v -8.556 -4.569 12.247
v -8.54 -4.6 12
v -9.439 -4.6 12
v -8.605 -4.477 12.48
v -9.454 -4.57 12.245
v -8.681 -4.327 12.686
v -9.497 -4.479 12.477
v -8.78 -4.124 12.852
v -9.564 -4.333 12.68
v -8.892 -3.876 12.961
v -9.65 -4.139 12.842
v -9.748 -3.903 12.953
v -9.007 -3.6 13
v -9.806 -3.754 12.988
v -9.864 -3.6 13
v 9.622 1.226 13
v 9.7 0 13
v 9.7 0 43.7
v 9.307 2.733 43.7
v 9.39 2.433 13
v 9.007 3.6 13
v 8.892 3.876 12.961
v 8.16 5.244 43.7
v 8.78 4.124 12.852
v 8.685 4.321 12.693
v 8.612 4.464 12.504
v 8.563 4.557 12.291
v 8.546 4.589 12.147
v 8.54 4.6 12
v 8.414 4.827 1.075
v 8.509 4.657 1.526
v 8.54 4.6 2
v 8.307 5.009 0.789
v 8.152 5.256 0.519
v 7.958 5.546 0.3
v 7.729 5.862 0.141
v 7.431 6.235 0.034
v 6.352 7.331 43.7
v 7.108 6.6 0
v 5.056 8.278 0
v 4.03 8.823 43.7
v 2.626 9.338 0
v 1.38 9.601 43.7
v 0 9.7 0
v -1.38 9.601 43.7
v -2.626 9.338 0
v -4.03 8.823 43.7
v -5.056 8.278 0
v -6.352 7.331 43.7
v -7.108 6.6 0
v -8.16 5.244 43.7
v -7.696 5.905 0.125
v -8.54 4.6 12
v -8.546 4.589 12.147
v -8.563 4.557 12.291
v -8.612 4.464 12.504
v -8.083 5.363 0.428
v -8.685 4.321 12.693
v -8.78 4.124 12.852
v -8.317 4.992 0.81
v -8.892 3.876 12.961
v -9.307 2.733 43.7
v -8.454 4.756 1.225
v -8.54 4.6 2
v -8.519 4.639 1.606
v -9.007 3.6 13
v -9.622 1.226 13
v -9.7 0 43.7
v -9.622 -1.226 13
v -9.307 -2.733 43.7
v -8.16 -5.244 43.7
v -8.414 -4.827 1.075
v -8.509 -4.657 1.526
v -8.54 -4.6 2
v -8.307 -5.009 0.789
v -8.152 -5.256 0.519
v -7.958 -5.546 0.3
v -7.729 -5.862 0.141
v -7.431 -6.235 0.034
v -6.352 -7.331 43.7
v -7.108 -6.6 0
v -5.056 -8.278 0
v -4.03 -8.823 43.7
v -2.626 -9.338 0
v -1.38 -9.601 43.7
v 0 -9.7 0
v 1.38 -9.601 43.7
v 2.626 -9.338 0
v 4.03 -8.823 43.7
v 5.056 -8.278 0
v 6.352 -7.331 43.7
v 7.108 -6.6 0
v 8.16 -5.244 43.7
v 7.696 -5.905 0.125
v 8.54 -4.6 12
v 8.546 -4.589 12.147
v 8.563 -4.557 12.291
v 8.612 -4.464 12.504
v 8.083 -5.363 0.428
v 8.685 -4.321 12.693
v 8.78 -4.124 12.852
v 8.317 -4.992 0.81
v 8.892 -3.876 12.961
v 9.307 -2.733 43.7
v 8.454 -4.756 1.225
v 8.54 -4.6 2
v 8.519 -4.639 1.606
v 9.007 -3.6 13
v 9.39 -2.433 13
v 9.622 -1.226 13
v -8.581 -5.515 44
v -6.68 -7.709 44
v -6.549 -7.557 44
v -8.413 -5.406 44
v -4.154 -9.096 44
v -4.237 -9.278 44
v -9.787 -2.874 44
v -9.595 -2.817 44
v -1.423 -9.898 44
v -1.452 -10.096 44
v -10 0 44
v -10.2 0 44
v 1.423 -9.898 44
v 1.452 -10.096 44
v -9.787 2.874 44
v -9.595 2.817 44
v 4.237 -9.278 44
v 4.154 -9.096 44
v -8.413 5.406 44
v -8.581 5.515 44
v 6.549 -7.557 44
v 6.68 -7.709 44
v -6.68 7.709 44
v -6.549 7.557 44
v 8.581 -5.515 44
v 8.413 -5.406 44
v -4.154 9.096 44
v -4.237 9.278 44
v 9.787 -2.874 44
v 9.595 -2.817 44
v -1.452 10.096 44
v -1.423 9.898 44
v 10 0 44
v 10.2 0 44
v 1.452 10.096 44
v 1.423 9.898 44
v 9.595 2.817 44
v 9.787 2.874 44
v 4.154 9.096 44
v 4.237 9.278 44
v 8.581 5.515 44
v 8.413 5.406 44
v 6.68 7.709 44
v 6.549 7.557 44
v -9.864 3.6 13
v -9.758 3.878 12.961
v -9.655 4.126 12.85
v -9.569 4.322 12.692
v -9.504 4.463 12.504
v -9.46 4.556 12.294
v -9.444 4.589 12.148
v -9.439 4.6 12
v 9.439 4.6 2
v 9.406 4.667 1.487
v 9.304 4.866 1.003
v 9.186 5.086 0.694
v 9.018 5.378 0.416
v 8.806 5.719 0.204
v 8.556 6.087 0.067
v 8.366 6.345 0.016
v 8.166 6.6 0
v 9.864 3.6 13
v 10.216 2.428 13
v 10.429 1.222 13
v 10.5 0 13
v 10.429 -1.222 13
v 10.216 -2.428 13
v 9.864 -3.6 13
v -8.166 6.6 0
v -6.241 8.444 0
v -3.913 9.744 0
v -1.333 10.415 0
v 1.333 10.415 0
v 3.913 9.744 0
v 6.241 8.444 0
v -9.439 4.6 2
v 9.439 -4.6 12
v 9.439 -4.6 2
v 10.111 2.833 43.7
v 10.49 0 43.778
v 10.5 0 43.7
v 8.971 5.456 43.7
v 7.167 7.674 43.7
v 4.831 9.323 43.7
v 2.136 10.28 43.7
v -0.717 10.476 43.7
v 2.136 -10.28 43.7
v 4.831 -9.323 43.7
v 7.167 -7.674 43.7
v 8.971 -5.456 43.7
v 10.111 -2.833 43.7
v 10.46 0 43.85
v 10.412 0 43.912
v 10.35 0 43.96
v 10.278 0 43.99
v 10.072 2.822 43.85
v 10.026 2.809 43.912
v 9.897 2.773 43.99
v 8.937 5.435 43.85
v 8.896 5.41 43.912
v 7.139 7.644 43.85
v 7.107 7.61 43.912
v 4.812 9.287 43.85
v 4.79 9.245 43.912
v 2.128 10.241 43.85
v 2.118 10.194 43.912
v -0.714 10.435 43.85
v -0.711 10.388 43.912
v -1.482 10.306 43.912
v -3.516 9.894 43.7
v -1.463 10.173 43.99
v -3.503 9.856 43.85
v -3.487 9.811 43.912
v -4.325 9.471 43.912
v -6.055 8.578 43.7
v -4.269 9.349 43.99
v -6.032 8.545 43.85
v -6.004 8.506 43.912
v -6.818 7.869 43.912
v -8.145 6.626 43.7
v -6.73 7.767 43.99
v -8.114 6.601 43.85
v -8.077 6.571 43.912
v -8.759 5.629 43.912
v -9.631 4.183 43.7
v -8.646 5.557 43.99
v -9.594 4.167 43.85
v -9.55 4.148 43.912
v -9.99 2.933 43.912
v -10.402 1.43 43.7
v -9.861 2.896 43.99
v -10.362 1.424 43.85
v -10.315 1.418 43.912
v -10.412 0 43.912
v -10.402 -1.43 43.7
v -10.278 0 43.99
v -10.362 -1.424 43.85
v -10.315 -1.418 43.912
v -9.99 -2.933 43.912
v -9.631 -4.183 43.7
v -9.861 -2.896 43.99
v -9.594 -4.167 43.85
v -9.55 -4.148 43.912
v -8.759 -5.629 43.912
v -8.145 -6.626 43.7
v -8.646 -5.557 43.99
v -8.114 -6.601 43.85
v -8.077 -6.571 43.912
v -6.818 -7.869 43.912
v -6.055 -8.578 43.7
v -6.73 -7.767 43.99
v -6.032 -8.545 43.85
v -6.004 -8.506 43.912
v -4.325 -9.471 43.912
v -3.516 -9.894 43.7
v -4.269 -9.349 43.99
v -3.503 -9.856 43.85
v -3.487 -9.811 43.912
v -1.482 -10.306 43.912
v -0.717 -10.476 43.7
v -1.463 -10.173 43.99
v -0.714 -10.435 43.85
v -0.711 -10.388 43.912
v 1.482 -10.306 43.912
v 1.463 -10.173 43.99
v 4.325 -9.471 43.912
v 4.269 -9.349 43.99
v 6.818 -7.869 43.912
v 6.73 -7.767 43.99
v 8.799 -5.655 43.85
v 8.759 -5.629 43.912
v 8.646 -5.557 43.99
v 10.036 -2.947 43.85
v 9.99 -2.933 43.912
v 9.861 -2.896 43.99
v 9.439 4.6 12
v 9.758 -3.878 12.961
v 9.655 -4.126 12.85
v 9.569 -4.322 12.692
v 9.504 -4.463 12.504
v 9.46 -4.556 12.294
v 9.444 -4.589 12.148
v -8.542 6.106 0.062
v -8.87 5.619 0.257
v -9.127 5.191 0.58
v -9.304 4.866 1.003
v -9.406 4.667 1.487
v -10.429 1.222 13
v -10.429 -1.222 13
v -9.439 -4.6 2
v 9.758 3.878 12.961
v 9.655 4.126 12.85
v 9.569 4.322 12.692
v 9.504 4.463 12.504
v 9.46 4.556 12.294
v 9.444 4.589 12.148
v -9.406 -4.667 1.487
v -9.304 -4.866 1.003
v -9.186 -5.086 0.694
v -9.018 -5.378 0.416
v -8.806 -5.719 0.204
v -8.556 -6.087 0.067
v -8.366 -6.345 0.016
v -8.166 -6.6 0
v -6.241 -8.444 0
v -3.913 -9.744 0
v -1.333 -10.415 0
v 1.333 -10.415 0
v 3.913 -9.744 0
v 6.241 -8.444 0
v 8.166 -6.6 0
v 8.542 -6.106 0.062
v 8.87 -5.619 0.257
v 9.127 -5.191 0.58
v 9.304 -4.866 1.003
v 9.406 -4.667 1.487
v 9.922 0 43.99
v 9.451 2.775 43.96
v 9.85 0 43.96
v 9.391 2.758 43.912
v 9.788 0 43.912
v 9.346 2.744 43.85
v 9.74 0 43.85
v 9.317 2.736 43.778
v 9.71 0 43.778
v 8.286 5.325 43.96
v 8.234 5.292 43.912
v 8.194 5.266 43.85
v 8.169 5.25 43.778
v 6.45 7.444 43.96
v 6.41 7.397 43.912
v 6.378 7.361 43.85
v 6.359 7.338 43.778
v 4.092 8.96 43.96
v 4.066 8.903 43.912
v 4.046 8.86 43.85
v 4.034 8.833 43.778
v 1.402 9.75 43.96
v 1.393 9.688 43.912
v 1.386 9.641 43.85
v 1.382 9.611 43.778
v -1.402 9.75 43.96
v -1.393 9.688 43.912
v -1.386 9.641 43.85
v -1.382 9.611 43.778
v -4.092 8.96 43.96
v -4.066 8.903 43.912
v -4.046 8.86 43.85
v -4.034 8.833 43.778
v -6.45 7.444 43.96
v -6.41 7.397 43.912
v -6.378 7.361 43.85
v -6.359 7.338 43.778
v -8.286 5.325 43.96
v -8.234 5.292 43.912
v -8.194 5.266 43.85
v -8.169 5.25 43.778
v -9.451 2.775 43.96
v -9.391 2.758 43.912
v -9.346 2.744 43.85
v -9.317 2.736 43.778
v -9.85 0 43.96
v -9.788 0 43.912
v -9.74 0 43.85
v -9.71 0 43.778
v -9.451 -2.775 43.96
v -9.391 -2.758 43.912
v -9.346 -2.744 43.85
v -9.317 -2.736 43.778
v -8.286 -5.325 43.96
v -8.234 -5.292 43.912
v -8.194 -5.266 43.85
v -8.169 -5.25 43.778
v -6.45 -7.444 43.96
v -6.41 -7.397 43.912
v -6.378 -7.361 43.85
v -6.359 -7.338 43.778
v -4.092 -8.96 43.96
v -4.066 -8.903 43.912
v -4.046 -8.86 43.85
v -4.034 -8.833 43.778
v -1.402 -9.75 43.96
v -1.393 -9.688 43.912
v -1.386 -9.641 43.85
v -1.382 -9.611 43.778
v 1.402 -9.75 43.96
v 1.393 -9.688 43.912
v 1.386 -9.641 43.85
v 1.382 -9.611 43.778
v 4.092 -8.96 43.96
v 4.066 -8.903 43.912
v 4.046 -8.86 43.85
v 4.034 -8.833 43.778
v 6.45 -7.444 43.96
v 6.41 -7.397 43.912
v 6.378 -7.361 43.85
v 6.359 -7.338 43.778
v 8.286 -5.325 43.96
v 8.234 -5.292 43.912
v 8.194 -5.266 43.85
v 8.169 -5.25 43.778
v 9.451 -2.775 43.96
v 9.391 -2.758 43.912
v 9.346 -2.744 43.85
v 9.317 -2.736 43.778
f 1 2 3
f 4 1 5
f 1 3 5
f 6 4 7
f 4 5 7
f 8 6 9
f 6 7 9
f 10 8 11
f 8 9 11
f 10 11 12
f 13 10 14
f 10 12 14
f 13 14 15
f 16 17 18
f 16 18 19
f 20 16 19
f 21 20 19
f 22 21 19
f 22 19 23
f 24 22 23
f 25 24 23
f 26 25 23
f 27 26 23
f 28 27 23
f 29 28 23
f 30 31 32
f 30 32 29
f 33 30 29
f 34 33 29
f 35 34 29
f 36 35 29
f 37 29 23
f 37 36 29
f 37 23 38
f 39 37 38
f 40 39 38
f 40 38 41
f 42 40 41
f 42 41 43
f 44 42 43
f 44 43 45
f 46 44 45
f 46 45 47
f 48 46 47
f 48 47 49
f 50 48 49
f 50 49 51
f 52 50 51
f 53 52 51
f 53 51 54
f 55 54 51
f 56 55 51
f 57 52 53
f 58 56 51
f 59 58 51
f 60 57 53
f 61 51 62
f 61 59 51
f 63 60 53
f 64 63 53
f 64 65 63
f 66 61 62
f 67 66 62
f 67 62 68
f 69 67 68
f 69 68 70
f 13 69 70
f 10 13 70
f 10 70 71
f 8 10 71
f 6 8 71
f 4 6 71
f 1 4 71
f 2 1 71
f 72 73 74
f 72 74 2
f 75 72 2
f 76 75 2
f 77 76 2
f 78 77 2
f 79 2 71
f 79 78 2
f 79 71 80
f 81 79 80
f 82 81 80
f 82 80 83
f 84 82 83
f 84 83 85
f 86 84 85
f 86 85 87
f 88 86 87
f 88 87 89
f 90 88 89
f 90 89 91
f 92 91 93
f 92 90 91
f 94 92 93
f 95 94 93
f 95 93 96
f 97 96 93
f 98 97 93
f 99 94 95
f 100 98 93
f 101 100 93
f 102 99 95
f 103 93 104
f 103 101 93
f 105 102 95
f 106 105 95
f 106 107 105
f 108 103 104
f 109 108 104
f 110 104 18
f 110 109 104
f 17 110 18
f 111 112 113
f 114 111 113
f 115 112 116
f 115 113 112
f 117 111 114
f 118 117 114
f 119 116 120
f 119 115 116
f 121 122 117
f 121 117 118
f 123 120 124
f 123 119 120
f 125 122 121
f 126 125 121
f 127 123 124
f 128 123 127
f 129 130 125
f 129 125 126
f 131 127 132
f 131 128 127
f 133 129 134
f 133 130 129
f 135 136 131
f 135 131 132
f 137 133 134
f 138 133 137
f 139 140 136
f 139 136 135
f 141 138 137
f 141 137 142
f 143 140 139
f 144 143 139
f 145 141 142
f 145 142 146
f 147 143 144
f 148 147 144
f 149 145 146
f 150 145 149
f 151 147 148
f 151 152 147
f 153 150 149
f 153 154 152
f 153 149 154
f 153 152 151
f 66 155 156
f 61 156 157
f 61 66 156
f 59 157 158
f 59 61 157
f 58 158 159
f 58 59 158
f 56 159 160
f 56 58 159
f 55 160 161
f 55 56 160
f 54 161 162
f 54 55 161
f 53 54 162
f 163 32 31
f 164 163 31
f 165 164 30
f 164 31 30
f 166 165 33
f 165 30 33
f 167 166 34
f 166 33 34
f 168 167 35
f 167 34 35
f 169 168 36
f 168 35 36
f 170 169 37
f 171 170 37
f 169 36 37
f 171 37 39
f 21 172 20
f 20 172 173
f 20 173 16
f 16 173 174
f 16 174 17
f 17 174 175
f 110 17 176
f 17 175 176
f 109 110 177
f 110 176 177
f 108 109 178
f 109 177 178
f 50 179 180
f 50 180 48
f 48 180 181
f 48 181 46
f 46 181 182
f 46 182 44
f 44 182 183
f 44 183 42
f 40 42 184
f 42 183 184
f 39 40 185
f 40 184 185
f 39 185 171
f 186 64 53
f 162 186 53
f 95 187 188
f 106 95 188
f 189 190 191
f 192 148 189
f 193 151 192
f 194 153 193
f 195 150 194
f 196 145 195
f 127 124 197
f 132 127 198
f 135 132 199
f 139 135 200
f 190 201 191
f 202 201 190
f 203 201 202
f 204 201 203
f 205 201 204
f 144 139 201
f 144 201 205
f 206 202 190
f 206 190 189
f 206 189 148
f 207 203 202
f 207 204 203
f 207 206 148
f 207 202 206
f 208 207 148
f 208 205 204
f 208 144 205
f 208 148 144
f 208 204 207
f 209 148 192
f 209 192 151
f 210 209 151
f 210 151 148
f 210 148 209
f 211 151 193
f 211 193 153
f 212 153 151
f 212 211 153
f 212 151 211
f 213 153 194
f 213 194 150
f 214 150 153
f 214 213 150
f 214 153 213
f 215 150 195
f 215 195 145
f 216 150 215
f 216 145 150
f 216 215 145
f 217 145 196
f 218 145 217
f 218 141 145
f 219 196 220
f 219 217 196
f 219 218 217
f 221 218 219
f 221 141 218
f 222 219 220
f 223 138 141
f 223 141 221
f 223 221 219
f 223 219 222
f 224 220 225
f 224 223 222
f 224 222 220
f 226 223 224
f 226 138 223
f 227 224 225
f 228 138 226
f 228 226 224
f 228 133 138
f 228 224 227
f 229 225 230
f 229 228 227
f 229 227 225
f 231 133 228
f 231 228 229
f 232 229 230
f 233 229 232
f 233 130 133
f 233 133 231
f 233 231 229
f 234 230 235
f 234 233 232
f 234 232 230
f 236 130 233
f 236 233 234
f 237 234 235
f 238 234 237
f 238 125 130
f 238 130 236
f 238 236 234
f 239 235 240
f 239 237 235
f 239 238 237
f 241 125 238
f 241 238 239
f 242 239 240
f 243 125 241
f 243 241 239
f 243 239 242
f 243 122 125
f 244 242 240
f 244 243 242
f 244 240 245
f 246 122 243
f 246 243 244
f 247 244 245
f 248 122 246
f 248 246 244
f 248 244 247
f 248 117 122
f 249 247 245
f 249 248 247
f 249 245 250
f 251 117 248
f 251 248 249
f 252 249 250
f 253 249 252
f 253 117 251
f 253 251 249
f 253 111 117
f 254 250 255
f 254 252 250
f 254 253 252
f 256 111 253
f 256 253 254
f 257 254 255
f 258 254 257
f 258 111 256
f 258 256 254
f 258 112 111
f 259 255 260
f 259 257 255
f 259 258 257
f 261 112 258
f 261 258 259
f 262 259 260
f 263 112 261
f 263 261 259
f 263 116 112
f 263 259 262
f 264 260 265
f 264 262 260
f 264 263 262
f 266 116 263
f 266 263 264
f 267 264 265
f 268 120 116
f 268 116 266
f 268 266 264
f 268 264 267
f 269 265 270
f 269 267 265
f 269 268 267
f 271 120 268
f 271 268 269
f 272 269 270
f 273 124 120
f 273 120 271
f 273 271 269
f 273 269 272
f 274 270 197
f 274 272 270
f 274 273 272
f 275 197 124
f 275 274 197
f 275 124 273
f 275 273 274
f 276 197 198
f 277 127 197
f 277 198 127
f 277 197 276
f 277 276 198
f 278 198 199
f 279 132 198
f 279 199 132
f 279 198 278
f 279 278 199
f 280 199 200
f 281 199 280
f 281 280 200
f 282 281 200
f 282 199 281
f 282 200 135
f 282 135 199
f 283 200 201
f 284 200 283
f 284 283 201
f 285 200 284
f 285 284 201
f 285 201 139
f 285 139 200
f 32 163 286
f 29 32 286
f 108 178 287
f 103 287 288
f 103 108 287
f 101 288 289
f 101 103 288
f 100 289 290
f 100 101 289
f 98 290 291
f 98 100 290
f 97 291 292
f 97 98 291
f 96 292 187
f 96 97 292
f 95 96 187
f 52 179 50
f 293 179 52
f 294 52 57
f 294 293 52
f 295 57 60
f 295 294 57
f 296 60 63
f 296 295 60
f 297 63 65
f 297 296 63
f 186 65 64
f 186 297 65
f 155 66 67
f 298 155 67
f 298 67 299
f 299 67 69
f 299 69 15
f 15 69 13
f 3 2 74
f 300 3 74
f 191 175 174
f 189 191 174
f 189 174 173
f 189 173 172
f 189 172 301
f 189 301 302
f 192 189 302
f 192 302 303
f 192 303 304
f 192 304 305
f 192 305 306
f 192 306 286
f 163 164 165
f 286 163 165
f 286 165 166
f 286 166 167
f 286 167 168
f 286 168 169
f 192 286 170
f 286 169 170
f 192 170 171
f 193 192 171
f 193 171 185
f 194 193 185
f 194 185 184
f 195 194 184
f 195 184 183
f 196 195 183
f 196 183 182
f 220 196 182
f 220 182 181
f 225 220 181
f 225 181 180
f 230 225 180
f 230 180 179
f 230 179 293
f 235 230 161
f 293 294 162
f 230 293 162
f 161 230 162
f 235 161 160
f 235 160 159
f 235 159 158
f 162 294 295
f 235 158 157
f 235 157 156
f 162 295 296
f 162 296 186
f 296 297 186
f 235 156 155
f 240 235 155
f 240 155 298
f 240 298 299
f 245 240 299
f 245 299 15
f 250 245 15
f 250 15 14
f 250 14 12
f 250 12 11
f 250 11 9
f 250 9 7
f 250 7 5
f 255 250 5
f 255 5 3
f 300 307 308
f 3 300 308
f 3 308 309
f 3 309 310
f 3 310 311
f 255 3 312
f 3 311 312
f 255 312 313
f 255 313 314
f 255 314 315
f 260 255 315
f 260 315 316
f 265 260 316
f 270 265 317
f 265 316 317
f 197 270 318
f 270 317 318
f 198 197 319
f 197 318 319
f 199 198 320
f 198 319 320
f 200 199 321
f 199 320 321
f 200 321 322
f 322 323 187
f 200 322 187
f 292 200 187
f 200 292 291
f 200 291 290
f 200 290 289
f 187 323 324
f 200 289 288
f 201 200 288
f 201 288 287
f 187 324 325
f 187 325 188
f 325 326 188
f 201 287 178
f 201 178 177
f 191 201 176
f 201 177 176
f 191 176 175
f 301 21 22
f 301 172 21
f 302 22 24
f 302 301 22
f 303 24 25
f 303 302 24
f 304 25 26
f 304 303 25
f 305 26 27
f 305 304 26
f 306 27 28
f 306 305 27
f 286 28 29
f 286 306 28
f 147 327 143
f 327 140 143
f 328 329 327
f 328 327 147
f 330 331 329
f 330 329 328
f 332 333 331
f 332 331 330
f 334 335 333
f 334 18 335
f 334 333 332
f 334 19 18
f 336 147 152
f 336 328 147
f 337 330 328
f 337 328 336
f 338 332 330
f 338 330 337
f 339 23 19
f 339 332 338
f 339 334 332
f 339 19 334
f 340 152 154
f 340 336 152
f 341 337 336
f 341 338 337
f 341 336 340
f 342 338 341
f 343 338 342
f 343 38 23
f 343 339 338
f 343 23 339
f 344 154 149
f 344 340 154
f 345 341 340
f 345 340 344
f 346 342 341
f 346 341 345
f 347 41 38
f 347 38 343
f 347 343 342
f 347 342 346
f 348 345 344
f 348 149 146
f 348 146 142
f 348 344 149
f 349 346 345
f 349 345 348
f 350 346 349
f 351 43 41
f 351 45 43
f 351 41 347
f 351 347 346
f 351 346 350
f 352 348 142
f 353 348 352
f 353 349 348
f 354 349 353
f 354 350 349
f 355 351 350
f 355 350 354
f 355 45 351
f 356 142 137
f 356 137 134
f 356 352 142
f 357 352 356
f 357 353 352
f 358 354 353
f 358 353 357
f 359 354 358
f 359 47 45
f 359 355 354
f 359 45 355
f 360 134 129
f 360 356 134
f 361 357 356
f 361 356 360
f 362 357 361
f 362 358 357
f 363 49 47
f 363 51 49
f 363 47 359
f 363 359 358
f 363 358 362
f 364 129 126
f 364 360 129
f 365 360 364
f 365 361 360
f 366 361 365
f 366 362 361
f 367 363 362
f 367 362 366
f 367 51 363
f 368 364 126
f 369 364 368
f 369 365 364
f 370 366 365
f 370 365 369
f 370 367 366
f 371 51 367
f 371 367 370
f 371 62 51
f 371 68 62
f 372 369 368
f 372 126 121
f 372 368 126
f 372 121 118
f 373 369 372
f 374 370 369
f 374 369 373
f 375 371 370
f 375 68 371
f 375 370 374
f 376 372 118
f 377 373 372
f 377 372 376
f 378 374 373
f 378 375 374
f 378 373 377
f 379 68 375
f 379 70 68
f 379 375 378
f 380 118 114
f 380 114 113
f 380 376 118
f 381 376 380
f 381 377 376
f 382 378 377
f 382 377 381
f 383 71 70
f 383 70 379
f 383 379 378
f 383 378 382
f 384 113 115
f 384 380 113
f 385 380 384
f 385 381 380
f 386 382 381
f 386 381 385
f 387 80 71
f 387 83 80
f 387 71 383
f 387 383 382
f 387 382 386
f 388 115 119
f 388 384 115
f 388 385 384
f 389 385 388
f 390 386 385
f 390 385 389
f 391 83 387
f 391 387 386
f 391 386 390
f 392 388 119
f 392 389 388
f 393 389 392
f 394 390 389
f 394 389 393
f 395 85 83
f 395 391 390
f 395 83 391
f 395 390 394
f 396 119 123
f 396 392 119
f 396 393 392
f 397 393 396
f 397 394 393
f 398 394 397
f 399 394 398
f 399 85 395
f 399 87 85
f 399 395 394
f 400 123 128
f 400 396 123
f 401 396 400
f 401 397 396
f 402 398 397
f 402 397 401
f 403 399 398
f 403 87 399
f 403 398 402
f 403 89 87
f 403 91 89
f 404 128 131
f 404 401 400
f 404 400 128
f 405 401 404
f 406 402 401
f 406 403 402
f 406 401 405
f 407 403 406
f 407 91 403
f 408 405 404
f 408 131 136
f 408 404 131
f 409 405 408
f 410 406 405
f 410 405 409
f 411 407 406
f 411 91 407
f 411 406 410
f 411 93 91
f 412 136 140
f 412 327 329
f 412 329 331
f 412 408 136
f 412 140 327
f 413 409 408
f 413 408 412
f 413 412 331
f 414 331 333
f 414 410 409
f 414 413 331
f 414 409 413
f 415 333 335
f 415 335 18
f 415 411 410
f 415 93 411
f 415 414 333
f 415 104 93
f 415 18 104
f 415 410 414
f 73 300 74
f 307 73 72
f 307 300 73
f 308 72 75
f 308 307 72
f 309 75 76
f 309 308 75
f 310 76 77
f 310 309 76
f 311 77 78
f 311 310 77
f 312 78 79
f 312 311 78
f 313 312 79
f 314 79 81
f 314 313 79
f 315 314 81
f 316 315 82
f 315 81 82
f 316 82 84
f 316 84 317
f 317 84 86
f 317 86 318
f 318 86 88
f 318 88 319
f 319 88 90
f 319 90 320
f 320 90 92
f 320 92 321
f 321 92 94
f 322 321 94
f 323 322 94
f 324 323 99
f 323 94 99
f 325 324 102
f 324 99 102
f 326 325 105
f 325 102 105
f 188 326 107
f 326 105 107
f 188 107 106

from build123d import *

# Parameters (mm, degrees)
F0_R        = 10.5
F0_R_2      = 9.7
F1_DEPTH    = 44
F3_DEPTH    = 20.75
F4_T1_DEPTH = 10.8988435946
F4_T3_DEPTH = 10.8988435946
F5_R        = 0.3
F6_R        = 1


# Not quite as in the source:
# - a fillet or chamfer that OpenCascade refuses, or shapes differently, is made with other operations: its cross-section is extruded or revolved along the edge and cut away or added


with BuildPart() as f1:
    # F0 (on Top) → F1 (new body)
    with BuildSketch(Plane.XY):
        Circle(F0_R)
        Circle(F0_R_2, mode=Mode.SUBTRACT)
    extrude(amount=F1_DEPTH)

    # F2 (on Right) → F3 (cut, symmetric)
    with BuildSketch(Plane.YZ):
        Polygon((-11.3, 0), (-11.3, -7.5), (11.3, -7.5), (11.3, 0), (4.6, 0), (4.6, 13), (-4.6, 13), (-4.6, 0), align=None)
    extrude(amount=F3_DEPTH, both=True, mode=Mode.SUBTRACT)

    # F4: fillet of radius 2 on 4 edges, made by hand

    # F4_s2 → F4_t1 (cut)
    with BuildSketch(Plane.YZ.offset(-14.4387499172)):
        with BuildLine():
            ThreePointArc((-4.6, 2), (-5.1857864376, 0.5857864376), (-6.6, 0))
            Line((-6.6, 0), (-4.6, 0))
            Line((-4.6, 0), (-4.6, 2))
        make_face()
        with BuildLine():
            ThreePointArc((6.6, 0), (5.1857864376, 0.5857864376), (4.6, 2))
            Line((4.6, 2), (4.6, 0))
            Line((4.6, 0), (6.6, 0))
        make_face()
    extrude(amount=F4_T1_DEPTH, mode=Mode.SUBTRACT)

    # F4_s4 → F4_t3 (cut)
    with BuildSketch(Plane.YZ.offset(3.5399063227)):
        with BuildLine():
            ThreePointArc((-6.6, 0), (-5.1857864376, 0.5857864376), (-4.6, 2))
            Line((-4.6, 2), (-4.6, 0))
            Line((-4.6, 0), (-6.6, 0))
        make_face()
        with BuildLine():
            ThreePointArc((4.6, 2), (5.1857864376, 0.5857864376), (6.6, 0))
            Line((6.6, 0), (4.6, 0))
            Line((4.6, 0), (4.6, 2))
        make_face()
    extrude(amount=F4_T3_DEPTH, mode=Mode.SUBTRACT)

    # F5
    f5_edges = [f1.edges().sort_by_distance(p)[0] for p in [
        (-10.5, 0, 44),
        (-9.7, 0, 44),
    ]]
    fillet(f5_edges, radius=F5_R)

    # F6
    f6_edges = [f1.edges().sort_by_distance(p)[0] for p in [
        (8.989328, -4.6, 13),
        (-8.989328, -4.6, 13),
        (8.989328, 4.6, 13),
        (-8.989328, 4.6, 13),
    ]]
    fillet(f6_edges, radius=F6_R)


solid = f1.part
